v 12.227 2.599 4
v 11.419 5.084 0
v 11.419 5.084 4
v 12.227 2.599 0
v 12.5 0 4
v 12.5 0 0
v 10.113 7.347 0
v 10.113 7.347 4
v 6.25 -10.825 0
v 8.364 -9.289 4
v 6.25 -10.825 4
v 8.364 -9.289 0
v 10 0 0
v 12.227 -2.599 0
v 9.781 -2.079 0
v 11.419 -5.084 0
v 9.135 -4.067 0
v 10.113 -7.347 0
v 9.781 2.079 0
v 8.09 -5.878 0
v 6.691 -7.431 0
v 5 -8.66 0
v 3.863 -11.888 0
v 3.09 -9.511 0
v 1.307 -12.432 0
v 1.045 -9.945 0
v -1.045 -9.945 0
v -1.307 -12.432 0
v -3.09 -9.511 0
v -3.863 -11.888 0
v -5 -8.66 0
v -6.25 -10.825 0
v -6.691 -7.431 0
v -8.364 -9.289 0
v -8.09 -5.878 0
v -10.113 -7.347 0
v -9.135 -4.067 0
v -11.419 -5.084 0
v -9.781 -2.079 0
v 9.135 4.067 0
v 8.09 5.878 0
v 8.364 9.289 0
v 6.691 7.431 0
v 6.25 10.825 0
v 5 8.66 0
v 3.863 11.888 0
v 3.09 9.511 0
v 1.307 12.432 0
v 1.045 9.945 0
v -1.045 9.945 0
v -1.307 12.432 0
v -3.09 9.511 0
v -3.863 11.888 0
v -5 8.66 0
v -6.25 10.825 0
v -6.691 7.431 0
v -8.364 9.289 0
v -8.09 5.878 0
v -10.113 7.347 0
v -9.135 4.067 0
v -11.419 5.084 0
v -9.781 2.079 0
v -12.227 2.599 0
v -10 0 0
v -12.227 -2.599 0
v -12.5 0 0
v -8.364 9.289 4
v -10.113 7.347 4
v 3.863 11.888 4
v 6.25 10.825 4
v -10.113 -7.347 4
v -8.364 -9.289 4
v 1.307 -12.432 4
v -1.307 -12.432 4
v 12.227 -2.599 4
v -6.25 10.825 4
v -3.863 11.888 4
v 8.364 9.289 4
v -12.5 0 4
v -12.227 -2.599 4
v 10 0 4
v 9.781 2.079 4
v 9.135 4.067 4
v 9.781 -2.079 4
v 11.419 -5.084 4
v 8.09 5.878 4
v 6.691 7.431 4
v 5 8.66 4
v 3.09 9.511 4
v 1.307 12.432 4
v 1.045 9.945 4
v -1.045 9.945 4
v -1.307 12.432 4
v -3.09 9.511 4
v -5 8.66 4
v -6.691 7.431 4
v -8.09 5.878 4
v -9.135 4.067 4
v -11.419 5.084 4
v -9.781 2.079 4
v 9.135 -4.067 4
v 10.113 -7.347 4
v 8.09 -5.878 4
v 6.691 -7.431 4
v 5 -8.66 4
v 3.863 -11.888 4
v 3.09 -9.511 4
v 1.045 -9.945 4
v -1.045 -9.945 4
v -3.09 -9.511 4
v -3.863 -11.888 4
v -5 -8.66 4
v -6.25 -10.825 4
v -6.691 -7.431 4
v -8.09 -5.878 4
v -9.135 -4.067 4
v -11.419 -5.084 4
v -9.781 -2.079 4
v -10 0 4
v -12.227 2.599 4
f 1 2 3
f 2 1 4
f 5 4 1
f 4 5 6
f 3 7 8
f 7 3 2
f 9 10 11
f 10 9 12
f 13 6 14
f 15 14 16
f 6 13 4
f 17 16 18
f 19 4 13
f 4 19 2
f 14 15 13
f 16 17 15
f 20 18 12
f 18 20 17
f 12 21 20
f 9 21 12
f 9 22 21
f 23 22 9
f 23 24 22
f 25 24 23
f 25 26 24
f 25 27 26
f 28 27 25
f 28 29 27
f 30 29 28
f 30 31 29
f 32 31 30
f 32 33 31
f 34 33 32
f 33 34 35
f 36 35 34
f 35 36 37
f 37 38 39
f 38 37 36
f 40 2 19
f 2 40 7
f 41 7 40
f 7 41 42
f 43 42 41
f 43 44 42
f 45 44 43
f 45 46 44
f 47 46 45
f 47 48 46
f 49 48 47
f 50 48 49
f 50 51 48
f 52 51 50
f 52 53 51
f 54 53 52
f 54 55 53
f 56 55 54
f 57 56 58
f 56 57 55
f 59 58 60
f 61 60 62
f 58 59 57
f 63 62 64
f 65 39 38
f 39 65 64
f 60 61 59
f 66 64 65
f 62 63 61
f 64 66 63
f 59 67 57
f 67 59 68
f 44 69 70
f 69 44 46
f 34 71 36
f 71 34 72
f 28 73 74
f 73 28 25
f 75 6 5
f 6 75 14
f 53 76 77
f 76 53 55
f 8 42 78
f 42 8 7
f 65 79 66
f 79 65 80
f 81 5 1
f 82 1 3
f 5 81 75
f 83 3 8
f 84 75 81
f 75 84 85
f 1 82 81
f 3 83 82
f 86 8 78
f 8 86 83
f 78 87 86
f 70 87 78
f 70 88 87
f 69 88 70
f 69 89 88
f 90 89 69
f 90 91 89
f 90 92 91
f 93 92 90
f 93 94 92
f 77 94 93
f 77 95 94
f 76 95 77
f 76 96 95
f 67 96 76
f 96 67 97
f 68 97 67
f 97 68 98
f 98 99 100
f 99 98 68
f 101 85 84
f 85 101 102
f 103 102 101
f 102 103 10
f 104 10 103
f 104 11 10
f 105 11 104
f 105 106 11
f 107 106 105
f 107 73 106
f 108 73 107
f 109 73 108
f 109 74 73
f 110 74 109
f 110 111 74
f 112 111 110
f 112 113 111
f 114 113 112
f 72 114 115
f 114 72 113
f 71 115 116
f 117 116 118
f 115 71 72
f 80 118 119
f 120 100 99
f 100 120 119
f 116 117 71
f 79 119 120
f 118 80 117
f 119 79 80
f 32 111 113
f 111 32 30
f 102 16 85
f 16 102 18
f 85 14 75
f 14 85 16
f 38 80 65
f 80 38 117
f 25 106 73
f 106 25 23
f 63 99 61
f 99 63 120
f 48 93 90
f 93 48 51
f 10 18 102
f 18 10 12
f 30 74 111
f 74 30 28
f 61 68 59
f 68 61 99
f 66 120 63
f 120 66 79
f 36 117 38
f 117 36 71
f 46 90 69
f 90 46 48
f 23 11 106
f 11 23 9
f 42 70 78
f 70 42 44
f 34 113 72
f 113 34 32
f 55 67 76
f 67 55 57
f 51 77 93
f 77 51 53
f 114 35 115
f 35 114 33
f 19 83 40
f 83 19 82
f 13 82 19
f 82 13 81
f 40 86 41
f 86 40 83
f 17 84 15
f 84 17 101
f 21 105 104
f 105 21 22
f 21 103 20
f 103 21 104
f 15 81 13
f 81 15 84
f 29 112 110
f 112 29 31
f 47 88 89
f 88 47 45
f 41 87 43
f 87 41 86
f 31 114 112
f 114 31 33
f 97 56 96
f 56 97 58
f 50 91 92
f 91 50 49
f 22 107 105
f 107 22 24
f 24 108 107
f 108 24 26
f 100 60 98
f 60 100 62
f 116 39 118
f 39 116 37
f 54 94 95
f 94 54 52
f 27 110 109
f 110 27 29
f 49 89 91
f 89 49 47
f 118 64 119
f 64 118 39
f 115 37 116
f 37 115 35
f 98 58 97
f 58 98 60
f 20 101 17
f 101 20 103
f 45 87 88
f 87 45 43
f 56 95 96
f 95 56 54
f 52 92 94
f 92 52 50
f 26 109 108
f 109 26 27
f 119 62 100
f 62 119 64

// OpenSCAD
difference() {
	cylinder(d = 25, h = 4);
	translate(v = [0, 0, -4]) {
		cylinder(d = 20, h = 8);
	}
}
